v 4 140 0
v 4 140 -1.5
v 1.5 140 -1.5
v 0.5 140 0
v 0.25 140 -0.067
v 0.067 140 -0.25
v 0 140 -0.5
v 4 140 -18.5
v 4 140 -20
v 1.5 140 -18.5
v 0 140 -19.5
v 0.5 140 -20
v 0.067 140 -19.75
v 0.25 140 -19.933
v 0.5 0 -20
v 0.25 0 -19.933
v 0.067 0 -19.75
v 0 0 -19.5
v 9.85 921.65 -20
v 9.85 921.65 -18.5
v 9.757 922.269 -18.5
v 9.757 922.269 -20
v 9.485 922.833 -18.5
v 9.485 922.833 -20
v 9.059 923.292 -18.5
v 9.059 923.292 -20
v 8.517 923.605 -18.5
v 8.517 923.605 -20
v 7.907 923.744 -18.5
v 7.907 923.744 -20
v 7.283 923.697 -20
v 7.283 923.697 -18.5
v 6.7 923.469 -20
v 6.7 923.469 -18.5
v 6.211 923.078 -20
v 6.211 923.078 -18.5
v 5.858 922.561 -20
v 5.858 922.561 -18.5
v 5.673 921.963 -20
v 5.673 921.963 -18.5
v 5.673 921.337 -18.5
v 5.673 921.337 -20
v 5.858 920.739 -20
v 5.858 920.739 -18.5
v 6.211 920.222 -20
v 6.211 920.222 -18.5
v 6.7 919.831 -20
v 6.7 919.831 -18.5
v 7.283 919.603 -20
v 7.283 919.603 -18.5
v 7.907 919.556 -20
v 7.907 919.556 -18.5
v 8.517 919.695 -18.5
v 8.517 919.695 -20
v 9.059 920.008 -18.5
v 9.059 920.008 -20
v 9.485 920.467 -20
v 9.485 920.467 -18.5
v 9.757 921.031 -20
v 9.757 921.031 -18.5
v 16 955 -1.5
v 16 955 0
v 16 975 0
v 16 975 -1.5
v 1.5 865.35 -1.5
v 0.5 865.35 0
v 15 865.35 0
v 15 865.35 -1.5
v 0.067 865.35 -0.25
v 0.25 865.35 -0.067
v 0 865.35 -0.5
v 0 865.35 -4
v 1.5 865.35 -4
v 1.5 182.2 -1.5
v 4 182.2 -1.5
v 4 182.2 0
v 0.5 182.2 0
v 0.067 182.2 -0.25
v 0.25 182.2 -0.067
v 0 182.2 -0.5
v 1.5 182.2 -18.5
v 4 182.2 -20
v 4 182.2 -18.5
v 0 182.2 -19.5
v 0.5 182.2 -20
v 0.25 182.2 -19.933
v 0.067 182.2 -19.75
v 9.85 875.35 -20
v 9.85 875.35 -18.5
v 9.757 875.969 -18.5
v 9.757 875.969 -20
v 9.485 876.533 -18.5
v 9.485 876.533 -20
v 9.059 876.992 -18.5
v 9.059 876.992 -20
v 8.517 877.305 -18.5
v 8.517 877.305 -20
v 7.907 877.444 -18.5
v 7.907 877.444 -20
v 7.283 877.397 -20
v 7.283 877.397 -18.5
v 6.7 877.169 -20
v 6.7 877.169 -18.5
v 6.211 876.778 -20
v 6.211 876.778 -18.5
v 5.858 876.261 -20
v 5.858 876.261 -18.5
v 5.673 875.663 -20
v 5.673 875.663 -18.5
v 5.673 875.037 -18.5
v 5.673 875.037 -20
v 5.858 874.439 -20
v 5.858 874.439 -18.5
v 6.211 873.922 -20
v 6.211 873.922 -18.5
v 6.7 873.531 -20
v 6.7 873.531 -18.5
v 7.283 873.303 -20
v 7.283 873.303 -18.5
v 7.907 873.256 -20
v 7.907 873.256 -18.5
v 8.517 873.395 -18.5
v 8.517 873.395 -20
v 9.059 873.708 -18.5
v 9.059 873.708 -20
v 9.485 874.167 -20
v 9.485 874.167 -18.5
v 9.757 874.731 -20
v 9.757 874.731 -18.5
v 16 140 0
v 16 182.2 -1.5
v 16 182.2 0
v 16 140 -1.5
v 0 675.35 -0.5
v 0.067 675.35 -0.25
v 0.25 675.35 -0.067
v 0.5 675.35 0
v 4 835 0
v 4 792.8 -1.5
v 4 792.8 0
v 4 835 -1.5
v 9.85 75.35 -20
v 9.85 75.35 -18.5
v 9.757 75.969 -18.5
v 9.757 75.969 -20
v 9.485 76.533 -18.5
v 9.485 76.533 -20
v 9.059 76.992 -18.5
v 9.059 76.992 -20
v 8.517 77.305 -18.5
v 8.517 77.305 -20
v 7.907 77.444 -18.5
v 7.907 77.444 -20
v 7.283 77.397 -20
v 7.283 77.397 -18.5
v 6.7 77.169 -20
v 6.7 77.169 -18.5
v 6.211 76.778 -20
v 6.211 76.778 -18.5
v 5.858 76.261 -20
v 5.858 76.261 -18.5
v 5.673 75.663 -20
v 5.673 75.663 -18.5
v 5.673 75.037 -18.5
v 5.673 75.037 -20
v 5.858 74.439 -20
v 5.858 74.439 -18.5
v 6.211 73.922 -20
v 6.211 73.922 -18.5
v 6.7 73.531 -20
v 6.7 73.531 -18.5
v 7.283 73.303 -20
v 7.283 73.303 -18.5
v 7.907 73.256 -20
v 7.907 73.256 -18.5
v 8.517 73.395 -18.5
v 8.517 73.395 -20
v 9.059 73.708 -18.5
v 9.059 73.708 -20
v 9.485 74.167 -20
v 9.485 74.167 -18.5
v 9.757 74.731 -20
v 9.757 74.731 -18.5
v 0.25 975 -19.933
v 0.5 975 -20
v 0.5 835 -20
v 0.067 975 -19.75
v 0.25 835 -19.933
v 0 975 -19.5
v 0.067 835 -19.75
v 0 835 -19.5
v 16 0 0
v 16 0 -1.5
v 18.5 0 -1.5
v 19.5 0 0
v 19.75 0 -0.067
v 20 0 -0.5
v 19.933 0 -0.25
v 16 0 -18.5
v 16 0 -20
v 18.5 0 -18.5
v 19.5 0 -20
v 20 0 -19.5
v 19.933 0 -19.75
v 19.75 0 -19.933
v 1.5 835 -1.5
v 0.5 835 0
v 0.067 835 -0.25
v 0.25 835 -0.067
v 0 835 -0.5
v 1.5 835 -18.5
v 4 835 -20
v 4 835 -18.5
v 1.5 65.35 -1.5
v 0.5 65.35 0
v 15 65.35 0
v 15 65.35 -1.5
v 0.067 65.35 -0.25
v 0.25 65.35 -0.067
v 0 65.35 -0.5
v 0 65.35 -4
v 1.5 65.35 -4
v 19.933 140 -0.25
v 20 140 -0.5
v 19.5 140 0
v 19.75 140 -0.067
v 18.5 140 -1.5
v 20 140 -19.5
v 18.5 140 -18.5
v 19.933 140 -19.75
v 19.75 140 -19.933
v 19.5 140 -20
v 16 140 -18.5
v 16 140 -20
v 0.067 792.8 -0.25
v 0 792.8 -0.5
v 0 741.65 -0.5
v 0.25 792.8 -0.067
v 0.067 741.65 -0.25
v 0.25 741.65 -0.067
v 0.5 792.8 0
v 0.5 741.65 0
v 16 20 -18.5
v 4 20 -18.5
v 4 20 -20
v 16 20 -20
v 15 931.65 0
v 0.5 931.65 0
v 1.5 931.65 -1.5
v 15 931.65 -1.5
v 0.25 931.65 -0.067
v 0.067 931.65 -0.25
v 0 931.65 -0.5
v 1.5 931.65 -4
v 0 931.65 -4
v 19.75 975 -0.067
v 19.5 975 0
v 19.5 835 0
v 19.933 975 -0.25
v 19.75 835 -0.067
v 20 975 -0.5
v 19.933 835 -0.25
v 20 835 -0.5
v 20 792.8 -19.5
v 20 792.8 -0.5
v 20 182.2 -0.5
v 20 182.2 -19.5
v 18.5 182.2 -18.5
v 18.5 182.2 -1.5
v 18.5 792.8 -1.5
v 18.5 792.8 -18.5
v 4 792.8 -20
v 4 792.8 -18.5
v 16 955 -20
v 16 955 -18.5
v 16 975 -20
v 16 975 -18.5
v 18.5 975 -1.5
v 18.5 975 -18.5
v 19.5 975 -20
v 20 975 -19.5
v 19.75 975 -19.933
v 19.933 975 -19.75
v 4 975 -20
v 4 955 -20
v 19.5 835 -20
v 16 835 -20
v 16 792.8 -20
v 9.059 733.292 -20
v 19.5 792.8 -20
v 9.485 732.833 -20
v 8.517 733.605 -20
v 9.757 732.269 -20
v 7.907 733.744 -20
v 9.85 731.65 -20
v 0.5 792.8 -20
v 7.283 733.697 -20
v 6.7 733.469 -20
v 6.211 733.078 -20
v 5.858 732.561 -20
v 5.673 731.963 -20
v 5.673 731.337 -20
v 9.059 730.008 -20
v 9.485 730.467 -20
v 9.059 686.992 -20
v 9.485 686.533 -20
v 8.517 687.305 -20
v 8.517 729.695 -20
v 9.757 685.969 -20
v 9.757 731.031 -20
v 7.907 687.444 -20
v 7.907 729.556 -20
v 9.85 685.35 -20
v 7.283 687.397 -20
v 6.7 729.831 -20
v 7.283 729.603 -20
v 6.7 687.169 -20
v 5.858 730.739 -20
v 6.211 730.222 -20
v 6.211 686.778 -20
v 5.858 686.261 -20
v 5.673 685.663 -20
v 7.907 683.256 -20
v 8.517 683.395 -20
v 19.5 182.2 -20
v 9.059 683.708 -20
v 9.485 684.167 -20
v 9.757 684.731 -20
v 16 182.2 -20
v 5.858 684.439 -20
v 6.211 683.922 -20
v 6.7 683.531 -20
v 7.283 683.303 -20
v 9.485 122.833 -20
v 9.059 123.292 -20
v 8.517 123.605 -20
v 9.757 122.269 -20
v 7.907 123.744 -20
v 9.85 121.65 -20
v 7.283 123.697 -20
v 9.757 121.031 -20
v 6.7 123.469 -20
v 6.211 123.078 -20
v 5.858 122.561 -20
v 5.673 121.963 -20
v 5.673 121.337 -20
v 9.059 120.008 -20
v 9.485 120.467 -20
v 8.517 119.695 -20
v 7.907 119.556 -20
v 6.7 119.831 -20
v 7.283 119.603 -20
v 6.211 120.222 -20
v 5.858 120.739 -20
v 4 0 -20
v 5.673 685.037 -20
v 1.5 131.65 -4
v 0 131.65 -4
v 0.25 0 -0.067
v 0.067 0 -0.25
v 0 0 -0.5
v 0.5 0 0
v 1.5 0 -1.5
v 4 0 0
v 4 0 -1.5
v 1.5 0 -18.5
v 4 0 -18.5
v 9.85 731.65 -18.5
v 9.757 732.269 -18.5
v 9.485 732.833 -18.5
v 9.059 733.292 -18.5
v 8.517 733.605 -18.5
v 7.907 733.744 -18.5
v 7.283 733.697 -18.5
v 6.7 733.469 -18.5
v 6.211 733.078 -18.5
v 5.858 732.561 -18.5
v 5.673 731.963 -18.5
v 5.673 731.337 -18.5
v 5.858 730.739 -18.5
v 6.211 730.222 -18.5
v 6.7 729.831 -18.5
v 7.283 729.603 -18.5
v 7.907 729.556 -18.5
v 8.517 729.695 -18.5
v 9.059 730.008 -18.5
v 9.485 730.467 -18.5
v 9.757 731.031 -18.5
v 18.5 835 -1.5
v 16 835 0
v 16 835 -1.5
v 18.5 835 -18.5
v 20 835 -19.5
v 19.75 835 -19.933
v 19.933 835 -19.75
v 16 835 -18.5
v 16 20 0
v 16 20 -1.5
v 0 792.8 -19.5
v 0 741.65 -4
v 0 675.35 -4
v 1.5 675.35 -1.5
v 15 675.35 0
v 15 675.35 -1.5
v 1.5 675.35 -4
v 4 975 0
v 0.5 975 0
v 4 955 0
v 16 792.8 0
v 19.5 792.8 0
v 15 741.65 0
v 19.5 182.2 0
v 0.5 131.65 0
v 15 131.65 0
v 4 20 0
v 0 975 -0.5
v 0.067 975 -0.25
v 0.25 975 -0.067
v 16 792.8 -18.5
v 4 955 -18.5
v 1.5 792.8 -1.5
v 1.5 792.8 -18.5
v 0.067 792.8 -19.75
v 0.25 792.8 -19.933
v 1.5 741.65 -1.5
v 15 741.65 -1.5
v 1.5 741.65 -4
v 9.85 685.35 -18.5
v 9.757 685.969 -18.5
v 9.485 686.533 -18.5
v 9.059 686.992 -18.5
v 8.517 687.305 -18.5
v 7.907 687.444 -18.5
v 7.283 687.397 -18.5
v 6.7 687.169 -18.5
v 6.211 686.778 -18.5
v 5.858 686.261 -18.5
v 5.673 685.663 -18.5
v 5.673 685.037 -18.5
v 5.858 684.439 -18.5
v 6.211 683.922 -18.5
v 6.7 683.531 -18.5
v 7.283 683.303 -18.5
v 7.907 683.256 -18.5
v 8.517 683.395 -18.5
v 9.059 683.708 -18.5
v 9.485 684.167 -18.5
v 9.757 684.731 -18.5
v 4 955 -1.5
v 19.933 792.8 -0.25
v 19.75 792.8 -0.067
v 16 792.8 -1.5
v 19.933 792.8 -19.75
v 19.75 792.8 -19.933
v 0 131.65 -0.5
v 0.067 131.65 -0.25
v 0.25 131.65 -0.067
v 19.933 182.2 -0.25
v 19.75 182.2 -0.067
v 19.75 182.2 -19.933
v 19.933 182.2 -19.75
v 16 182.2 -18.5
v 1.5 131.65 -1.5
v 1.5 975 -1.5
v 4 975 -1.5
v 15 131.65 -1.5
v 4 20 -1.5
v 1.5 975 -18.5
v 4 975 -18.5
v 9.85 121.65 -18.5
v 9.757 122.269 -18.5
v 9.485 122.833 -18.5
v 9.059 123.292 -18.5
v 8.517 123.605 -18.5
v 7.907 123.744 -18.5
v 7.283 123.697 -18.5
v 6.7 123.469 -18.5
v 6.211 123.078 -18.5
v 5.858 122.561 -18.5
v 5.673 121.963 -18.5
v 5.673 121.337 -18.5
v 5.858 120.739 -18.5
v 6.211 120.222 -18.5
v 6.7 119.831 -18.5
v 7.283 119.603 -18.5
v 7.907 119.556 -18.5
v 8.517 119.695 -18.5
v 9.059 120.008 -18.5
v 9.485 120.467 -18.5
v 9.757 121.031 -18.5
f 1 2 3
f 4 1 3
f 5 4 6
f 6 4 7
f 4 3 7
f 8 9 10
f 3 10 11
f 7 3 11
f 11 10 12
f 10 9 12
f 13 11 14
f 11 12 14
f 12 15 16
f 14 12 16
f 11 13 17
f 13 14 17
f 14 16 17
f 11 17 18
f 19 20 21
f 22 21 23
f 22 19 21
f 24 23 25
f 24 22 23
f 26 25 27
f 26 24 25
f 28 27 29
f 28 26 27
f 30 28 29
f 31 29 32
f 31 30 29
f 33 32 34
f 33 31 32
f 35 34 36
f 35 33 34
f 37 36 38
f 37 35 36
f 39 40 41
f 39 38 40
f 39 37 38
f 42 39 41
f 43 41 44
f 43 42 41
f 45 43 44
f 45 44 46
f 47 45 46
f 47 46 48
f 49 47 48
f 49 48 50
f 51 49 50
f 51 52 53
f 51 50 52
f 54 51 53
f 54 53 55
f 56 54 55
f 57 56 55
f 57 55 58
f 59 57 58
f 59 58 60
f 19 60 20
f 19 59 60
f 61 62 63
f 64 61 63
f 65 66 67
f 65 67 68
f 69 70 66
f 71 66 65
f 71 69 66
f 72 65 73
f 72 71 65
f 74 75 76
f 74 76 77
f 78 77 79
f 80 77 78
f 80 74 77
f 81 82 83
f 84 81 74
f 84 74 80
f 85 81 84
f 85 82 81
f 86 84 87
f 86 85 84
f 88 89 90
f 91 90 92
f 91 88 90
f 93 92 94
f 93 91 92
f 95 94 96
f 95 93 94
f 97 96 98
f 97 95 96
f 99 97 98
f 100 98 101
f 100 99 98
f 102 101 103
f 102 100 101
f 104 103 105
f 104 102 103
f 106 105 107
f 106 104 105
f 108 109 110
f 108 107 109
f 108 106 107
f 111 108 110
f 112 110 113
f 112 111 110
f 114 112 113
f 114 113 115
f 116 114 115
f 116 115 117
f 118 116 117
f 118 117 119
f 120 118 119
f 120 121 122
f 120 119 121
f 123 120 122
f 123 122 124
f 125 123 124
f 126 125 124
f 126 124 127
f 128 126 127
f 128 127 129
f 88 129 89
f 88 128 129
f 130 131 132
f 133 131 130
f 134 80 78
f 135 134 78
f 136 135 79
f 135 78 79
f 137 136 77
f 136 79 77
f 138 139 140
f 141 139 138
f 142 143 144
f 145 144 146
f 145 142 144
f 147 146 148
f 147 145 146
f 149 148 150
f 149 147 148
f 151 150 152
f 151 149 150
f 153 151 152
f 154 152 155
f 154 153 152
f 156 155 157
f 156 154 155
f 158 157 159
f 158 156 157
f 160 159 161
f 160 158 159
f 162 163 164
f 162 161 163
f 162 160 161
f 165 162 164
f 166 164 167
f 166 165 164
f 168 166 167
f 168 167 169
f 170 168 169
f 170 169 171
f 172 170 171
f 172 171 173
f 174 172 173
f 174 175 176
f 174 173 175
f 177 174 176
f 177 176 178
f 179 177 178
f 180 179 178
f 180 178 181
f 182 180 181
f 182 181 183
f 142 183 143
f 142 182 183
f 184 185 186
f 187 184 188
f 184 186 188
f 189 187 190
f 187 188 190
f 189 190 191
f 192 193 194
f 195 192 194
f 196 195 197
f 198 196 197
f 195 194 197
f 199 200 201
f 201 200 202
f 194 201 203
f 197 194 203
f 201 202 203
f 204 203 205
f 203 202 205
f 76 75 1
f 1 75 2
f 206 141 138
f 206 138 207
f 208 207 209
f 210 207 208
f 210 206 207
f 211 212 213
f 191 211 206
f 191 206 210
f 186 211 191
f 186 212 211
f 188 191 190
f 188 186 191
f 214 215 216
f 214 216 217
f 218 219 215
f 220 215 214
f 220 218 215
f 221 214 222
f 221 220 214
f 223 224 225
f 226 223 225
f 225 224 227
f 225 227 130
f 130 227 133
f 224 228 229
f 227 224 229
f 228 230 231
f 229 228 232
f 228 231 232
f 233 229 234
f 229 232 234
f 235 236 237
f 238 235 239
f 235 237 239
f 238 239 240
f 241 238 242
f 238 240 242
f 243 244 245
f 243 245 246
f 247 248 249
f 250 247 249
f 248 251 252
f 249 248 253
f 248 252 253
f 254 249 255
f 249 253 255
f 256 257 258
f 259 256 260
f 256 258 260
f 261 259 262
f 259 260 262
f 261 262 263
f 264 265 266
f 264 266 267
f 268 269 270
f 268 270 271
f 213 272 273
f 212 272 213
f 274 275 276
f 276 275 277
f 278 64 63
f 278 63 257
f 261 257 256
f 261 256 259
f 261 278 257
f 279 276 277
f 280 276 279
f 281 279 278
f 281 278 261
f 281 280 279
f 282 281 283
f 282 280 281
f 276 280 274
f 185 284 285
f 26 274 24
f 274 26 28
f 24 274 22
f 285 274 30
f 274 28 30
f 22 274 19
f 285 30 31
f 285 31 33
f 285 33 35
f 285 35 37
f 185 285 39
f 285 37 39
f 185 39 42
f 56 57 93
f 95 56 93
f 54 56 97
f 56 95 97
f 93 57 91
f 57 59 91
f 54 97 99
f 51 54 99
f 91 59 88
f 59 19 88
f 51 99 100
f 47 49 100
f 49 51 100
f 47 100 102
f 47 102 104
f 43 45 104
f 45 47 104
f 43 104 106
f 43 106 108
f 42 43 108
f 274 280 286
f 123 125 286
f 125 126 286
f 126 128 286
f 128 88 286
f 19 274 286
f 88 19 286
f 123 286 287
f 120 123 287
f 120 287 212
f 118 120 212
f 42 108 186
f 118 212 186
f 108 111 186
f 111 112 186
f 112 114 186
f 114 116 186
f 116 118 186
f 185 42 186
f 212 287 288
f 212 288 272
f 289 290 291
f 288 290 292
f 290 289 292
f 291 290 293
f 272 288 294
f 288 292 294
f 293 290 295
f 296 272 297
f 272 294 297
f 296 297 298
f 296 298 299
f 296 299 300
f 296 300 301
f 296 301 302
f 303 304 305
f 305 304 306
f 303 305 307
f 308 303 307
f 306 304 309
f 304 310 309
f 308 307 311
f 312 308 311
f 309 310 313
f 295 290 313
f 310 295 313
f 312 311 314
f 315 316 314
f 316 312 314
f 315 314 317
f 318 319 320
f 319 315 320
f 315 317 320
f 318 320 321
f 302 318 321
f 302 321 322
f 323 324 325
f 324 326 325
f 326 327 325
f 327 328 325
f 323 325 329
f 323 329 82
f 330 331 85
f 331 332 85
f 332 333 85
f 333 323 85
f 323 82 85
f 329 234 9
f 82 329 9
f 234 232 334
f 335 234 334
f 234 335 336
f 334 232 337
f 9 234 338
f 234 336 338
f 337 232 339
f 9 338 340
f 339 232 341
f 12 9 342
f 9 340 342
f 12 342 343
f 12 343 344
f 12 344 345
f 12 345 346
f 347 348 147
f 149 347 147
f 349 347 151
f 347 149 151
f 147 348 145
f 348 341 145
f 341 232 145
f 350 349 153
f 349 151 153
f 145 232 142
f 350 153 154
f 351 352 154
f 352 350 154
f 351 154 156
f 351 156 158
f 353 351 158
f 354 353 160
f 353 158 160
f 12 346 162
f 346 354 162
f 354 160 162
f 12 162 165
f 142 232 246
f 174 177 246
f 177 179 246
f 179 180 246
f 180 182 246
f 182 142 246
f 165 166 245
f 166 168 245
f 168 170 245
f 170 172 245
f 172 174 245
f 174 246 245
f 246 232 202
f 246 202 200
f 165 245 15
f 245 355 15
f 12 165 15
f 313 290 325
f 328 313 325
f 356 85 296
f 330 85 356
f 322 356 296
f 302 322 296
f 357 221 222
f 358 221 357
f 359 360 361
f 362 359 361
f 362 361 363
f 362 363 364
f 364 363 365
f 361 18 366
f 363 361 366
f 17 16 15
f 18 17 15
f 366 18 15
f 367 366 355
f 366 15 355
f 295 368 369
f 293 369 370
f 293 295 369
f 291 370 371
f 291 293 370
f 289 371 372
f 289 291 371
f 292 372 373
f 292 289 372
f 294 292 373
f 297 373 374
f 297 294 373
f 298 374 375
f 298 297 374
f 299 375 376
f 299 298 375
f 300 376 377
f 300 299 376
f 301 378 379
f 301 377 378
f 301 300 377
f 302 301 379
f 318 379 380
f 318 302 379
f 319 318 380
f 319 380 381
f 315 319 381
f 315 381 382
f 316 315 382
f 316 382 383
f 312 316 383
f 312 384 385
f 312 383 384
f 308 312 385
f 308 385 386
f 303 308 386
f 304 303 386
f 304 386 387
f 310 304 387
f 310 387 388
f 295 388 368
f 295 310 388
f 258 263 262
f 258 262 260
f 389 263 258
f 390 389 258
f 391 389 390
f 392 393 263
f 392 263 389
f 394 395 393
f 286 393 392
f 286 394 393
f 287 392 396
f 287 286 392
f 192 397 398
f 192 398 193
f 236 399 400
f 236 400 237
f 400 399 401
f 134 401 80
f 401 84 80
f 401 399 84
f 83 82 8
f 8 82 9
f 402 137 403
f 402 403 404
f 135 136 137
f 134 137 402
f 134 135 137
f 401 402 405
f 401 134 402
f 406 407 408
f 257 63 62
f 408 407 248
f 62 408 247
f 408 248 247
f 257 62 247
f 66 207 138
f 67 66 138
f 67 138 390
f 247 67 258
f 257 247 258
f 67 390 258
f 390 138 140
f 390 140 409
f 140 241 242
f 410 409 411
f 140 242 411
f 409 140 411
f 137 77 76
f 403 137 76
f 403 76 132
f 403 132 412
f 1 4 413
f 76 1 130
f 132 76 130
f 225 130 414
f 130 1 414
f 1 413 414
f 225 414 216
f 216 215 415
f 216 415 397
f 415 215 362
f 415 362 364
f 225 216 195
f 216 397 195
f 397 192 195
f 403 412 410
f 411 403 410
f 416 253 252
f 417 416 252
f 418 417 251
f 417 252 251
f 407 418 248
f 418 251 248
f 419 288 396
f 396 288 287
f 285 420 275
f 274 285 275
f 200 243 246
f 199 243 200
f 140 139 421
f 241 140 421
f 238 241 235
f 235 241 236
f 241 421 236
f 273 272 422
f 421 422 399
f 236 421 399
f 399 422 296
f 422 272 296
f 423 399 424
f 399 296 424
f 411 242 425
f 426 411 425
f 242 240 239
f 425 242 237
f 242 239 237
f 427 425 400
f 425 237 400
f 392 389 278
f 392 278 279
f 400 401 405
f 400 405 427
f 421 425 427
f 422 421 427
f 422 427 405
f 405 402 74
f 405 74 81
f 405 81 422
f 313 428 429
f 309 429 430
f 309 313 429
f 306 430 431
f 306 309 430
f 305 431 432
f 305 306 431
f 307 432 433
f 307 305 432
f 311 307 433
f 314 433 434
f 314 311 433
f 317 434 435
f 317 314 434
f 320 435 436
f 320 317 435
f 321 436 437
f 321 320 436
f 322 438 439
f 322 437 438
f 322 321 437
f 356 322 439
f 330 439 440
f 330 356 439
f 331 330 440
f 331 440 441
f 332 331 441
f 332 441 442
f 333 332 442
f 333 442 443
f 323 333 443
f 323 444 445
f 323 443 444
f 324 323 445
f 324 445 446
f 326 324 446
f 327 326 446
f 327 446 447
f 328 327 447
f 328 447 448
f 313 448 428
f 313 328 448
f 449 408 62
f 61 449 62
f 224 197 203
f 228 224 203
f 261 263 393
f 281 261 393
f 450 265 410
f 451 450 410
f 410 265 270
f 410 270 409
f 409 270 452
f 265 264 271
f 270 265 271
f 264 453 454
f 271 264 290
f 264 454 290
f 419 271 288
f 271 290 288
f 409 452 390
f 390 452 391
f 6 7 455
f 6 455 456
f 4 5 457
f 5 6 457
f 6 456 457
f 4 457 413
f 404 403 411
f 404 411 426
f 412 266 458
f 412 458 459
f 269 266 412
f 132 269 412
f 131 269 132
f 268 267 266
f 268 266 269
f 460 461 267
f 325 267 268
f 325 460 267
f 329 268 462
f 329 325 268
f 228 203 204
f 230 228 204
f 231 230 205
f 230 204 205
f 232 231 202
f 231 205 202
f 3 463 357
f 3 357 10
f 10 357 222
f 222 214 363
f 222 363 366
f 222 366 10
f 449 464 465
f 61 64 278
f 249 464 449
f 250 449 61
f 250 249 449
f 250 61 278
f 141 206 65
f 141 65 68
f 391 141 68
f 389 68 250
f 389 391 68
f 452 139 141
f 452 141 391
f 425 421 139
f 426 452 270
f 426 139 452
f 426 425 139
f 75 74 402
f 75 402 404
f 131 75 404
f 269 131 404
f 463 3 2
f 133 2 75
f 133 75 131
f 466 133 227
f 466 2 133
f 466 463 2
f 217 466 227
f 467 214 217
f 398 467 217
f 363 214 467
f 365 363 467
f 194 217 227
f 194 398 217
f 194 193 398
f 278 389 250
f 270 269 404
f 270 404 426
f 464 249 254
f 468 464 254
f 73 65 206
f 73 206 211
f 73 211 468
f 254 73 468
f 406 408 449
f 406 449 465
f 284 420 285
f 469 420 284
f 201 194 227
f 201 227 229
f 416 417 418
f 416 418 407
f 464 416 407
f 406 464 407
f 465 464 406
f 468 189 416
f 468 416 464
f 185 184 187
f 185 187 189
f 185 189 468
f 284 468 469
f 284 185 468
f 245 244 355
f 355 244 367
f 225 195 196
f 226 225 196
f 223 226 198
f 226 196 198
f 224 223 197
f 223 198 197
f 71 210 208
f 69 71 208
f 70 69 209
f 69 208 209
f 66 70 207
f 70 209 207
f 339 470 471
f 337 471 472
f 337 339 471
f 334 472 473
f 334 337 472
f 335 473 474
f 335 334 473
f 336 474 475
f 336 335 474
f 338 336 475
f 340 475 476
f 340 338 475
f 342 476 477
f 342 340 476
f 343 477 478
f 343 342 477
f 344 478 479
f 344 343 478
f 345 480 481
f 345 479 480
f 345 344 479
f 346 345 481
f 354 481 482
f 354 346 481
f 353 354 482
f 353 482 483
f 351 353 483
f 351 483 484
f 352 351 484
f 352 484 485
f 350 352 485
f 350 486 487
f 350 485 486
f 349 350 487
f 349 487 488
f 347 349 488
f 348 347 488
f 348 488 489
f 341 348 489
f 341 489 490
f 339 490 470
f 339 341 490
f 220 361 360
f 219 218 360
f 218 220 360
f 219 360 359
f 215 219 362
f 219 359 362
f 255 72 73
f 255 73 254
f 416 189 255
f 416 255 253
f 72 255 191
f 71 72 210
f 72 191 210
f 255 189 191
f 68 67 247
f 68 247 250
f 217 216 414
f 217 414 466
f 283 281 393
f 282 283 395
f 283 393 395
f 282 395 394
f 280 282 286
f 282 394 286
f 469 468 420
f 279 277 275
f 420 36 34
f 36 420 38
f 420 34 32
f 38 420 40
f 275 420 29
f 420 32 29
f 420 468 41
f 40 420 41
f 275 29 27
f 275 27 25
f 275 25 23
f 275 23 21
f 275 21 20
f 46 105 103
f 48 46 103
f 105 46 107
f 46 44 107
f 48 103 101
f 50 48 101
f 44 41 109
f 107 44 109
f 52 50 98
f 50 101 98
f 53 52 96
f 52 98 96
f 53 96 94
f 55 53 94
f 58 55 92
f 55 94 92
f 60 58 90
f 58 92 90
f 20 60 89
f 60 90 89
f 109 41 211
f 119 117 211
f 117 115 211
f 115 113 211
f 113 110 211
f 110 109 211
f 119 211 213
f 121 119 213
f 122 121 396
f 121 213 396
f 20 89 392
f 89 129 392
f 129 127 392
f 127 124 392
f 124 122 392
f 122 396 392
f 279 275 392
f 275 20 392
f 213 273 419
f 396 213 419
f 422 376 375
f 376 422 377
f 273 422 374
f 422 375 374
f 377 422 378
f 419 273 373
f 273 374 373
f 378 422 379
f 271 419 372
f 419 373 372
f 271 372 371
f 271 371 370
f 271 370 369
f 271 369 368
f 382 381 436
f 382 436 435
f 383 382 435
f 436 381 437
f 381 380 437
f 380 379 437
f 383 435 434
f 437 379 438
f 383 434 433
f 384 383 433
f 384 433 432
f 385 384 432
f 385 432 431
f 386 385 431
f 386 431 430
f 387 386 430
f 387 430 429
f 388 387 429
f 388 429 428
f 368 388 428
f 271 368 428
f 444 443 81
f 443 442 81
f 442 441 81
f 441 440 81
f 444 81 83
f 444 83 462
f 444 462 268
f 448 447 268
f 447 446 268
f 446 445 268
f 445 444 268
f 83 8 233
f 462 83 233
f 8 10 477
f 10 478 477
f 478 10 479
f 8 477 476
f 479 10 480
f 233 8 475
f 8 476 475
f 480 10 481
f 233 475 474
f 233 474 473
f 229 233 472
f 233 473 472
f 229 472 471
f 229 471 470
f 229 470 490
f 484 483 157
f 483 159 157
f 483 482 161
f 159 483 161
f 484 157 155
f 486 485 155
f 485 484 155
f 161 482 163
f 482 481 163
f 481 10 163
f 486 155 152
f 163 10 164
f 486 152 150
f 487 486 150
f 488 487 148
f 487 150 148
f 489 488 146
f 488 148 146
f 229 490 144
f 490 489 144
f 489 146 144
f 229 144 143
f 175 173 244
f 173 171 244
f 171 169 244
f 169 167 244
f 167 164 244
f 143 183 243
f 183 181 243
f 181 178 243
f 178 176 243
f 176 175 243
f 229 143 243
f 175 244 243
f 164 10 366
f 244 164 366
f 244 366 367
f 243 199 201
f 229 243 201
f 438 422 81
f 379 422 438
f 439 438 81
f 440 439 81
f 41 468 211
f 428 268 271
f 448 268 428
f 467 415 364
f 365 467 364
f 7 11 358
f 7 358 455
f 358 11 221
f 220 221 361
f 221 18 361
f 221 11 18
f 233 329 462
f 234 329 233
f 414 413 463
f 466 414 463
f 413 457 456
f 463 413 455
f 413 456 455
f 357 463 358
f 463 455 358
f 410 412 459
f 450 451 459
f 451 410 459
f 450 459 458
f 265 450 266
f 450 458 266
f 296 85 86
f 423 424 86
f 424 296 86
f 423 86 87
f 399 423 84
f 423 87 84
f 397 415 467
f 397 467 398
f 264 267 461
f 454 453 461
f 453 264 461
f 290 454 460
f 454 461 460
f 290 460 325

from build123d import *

# Parameters (mm, degrees)
SKETCH1_W           = 17
SKETCH1_H           = 17
BOSS_EXTRUDE1_DEPTH = 975
SKETCH2_W           = 12
SKETCH2_H           = 20
CUT_EXTRUDE1_DEPTH  = 1177
SKETCH3_W           = 4
SKETCH3_H           = 42.2
CUT_EXTRUDE2_DEPTH  = 1177
SKETCH4_R           = 2.1
CUT_EXTRUDE3_DEPTH  = 10
CUT_EXTRUDE4_START  = -20
SKETCH6_W           = 4
SKETCH6_H           = 66.3
CUT_EXTRUDE4_DEPTH  = 15
LPATTERN1_COUNT     = 2
LPATTERN1_PITCH     = 190
LPATTERN2_COUNT     = 2
LPATTERN2_PITCH     = 800


with BuildPart() as part:
    # Sketch1 → Boss-Extrude1 (new body)
    with BuildSketch(Plane(origin=(0, 0, 0), x_dir=(1, 0, 0), z_dir=(0, 1, 0))):
        with BuildLine():
            Line((0.5, 0), (19.5, 0))
            ThreePointArc((19.5, 0), (19.853553391, 0.146446609), (20, 0.5))
            Line((20, 0.5), (20, 19.5))
            ThreePointArc((20, 19.5), (19.853553391, 19.853553391), (19.5, 20))
            Line((19.5, 20), (0.5, 20))
            ThreePointArc((0.5, 20), (0.146446609, 19.853553391), (0, 19.5))
            Line((0, 19.5), (0, 0.5))
            ThreePointArc((0, 0.5), (0.146446609, 0.146446609), (0.5, 0))
        make_face()
        with Locations((10, 10)):
            Rectangle(SKETCH1_W, SKETCH1_H, mode=Mode.SUBTRACT)
    extrude(amount=BOSS_EXTRUDE1_DEPTH)

    # Sketch2 → Cut-Extrude1 (cut)
    with BuildSketch(Plane.XY):
        with Locations((10, 965)):
            Rectangle(SKETCH2_W, SKETCH2_H)
    cut_extrude1 = extrude(amount=-CUT_EXTRUDE1_DEPTH, mode=Mode.SUBTRACT)

    # Sketch3 → Cut-Extrude2 (cut)
    with BuildSketch(Plane(origin=(0, 0, -20), x_dir=(-1, 0, 0), z_dir=(0, 0, -1))):
        with Locations((-2, 813.9)):
            Rectangle(SKETCH3_W, SKETCH3_H)
        with Locations((-18, 813.9)):
            Rectangle(SKETCH3_W, SKETCH3_H)
    cut_extrude2 = extrude(amount=-CUT_EXTRUDE2_DEPTH, mode=Mode.SUBTRACT)

    # Mirror1: Cut-Extrude1, Cut-Extrude2 across plane
    add(cut_extrude1.mirror(Plane.ZX.offset(487.5)), mode=Mode.SUBTRACT)
    add(cut_extrude2.mirror(Plane.ZX.offset(487.5)), mode=Mode.SUBTRACT)

    # Sketch4 → Cut-Extrude3 (cut)
    with BuildSketch(Plane.XY.offset(-20)):
        with Locations((7.75, 921.65)):
            Circle(SKETCH4_R)
        with Locations((7.75, 875.35)):
            Circle(SKETCH4_R)
    cut_extrude3 = extrude(amount=CUT_EXTRUDE3_DEPTH, mode=Mode.SUBTRACT)

    # Sketch6 → Cut-Extrude4 (cut)
    with BuildSketch(Plane(origin=(20, 0, 0), x_dir=(0, 0, -1), z_dir=(1, 0, 0)).offset(CUT_EXTRUDE4_START)):
        with Locations((2, 898.5)):
            Rectangle(SKETCH6_W, SKETCH6_H)
    cut_extrude4 = extrude(amount=CUT_EXTRUDE4_DEPTH, mode=Mode.SUBTRACT)

    # LPattern1: Cut-Extrude3, Cut-Extrude4 ×2
    with Locations(*[(0, -i * LPATTERN1_PITCH, 0) for i in range(1, LPATTERN1_COUNT)]):
        add(cut_extrude3, mode=Mode.SUBTRACT)
        add(cut_extrude4, mode=Mode.SUBTRACT)

    # LPattern2: Cut-Extrude3, Cut-Extrude4 ×2
    with Locations(*[(0, -i * LPATTERN2_PITCH, 0) for i in range(1, LPATTERN2_COUNT)]):
        add(cut_extrude3, mode=Mode.SUBTRACT)
        add(cut_extrude4, mode=Mode.SUBTRACT)


solid = part.part
